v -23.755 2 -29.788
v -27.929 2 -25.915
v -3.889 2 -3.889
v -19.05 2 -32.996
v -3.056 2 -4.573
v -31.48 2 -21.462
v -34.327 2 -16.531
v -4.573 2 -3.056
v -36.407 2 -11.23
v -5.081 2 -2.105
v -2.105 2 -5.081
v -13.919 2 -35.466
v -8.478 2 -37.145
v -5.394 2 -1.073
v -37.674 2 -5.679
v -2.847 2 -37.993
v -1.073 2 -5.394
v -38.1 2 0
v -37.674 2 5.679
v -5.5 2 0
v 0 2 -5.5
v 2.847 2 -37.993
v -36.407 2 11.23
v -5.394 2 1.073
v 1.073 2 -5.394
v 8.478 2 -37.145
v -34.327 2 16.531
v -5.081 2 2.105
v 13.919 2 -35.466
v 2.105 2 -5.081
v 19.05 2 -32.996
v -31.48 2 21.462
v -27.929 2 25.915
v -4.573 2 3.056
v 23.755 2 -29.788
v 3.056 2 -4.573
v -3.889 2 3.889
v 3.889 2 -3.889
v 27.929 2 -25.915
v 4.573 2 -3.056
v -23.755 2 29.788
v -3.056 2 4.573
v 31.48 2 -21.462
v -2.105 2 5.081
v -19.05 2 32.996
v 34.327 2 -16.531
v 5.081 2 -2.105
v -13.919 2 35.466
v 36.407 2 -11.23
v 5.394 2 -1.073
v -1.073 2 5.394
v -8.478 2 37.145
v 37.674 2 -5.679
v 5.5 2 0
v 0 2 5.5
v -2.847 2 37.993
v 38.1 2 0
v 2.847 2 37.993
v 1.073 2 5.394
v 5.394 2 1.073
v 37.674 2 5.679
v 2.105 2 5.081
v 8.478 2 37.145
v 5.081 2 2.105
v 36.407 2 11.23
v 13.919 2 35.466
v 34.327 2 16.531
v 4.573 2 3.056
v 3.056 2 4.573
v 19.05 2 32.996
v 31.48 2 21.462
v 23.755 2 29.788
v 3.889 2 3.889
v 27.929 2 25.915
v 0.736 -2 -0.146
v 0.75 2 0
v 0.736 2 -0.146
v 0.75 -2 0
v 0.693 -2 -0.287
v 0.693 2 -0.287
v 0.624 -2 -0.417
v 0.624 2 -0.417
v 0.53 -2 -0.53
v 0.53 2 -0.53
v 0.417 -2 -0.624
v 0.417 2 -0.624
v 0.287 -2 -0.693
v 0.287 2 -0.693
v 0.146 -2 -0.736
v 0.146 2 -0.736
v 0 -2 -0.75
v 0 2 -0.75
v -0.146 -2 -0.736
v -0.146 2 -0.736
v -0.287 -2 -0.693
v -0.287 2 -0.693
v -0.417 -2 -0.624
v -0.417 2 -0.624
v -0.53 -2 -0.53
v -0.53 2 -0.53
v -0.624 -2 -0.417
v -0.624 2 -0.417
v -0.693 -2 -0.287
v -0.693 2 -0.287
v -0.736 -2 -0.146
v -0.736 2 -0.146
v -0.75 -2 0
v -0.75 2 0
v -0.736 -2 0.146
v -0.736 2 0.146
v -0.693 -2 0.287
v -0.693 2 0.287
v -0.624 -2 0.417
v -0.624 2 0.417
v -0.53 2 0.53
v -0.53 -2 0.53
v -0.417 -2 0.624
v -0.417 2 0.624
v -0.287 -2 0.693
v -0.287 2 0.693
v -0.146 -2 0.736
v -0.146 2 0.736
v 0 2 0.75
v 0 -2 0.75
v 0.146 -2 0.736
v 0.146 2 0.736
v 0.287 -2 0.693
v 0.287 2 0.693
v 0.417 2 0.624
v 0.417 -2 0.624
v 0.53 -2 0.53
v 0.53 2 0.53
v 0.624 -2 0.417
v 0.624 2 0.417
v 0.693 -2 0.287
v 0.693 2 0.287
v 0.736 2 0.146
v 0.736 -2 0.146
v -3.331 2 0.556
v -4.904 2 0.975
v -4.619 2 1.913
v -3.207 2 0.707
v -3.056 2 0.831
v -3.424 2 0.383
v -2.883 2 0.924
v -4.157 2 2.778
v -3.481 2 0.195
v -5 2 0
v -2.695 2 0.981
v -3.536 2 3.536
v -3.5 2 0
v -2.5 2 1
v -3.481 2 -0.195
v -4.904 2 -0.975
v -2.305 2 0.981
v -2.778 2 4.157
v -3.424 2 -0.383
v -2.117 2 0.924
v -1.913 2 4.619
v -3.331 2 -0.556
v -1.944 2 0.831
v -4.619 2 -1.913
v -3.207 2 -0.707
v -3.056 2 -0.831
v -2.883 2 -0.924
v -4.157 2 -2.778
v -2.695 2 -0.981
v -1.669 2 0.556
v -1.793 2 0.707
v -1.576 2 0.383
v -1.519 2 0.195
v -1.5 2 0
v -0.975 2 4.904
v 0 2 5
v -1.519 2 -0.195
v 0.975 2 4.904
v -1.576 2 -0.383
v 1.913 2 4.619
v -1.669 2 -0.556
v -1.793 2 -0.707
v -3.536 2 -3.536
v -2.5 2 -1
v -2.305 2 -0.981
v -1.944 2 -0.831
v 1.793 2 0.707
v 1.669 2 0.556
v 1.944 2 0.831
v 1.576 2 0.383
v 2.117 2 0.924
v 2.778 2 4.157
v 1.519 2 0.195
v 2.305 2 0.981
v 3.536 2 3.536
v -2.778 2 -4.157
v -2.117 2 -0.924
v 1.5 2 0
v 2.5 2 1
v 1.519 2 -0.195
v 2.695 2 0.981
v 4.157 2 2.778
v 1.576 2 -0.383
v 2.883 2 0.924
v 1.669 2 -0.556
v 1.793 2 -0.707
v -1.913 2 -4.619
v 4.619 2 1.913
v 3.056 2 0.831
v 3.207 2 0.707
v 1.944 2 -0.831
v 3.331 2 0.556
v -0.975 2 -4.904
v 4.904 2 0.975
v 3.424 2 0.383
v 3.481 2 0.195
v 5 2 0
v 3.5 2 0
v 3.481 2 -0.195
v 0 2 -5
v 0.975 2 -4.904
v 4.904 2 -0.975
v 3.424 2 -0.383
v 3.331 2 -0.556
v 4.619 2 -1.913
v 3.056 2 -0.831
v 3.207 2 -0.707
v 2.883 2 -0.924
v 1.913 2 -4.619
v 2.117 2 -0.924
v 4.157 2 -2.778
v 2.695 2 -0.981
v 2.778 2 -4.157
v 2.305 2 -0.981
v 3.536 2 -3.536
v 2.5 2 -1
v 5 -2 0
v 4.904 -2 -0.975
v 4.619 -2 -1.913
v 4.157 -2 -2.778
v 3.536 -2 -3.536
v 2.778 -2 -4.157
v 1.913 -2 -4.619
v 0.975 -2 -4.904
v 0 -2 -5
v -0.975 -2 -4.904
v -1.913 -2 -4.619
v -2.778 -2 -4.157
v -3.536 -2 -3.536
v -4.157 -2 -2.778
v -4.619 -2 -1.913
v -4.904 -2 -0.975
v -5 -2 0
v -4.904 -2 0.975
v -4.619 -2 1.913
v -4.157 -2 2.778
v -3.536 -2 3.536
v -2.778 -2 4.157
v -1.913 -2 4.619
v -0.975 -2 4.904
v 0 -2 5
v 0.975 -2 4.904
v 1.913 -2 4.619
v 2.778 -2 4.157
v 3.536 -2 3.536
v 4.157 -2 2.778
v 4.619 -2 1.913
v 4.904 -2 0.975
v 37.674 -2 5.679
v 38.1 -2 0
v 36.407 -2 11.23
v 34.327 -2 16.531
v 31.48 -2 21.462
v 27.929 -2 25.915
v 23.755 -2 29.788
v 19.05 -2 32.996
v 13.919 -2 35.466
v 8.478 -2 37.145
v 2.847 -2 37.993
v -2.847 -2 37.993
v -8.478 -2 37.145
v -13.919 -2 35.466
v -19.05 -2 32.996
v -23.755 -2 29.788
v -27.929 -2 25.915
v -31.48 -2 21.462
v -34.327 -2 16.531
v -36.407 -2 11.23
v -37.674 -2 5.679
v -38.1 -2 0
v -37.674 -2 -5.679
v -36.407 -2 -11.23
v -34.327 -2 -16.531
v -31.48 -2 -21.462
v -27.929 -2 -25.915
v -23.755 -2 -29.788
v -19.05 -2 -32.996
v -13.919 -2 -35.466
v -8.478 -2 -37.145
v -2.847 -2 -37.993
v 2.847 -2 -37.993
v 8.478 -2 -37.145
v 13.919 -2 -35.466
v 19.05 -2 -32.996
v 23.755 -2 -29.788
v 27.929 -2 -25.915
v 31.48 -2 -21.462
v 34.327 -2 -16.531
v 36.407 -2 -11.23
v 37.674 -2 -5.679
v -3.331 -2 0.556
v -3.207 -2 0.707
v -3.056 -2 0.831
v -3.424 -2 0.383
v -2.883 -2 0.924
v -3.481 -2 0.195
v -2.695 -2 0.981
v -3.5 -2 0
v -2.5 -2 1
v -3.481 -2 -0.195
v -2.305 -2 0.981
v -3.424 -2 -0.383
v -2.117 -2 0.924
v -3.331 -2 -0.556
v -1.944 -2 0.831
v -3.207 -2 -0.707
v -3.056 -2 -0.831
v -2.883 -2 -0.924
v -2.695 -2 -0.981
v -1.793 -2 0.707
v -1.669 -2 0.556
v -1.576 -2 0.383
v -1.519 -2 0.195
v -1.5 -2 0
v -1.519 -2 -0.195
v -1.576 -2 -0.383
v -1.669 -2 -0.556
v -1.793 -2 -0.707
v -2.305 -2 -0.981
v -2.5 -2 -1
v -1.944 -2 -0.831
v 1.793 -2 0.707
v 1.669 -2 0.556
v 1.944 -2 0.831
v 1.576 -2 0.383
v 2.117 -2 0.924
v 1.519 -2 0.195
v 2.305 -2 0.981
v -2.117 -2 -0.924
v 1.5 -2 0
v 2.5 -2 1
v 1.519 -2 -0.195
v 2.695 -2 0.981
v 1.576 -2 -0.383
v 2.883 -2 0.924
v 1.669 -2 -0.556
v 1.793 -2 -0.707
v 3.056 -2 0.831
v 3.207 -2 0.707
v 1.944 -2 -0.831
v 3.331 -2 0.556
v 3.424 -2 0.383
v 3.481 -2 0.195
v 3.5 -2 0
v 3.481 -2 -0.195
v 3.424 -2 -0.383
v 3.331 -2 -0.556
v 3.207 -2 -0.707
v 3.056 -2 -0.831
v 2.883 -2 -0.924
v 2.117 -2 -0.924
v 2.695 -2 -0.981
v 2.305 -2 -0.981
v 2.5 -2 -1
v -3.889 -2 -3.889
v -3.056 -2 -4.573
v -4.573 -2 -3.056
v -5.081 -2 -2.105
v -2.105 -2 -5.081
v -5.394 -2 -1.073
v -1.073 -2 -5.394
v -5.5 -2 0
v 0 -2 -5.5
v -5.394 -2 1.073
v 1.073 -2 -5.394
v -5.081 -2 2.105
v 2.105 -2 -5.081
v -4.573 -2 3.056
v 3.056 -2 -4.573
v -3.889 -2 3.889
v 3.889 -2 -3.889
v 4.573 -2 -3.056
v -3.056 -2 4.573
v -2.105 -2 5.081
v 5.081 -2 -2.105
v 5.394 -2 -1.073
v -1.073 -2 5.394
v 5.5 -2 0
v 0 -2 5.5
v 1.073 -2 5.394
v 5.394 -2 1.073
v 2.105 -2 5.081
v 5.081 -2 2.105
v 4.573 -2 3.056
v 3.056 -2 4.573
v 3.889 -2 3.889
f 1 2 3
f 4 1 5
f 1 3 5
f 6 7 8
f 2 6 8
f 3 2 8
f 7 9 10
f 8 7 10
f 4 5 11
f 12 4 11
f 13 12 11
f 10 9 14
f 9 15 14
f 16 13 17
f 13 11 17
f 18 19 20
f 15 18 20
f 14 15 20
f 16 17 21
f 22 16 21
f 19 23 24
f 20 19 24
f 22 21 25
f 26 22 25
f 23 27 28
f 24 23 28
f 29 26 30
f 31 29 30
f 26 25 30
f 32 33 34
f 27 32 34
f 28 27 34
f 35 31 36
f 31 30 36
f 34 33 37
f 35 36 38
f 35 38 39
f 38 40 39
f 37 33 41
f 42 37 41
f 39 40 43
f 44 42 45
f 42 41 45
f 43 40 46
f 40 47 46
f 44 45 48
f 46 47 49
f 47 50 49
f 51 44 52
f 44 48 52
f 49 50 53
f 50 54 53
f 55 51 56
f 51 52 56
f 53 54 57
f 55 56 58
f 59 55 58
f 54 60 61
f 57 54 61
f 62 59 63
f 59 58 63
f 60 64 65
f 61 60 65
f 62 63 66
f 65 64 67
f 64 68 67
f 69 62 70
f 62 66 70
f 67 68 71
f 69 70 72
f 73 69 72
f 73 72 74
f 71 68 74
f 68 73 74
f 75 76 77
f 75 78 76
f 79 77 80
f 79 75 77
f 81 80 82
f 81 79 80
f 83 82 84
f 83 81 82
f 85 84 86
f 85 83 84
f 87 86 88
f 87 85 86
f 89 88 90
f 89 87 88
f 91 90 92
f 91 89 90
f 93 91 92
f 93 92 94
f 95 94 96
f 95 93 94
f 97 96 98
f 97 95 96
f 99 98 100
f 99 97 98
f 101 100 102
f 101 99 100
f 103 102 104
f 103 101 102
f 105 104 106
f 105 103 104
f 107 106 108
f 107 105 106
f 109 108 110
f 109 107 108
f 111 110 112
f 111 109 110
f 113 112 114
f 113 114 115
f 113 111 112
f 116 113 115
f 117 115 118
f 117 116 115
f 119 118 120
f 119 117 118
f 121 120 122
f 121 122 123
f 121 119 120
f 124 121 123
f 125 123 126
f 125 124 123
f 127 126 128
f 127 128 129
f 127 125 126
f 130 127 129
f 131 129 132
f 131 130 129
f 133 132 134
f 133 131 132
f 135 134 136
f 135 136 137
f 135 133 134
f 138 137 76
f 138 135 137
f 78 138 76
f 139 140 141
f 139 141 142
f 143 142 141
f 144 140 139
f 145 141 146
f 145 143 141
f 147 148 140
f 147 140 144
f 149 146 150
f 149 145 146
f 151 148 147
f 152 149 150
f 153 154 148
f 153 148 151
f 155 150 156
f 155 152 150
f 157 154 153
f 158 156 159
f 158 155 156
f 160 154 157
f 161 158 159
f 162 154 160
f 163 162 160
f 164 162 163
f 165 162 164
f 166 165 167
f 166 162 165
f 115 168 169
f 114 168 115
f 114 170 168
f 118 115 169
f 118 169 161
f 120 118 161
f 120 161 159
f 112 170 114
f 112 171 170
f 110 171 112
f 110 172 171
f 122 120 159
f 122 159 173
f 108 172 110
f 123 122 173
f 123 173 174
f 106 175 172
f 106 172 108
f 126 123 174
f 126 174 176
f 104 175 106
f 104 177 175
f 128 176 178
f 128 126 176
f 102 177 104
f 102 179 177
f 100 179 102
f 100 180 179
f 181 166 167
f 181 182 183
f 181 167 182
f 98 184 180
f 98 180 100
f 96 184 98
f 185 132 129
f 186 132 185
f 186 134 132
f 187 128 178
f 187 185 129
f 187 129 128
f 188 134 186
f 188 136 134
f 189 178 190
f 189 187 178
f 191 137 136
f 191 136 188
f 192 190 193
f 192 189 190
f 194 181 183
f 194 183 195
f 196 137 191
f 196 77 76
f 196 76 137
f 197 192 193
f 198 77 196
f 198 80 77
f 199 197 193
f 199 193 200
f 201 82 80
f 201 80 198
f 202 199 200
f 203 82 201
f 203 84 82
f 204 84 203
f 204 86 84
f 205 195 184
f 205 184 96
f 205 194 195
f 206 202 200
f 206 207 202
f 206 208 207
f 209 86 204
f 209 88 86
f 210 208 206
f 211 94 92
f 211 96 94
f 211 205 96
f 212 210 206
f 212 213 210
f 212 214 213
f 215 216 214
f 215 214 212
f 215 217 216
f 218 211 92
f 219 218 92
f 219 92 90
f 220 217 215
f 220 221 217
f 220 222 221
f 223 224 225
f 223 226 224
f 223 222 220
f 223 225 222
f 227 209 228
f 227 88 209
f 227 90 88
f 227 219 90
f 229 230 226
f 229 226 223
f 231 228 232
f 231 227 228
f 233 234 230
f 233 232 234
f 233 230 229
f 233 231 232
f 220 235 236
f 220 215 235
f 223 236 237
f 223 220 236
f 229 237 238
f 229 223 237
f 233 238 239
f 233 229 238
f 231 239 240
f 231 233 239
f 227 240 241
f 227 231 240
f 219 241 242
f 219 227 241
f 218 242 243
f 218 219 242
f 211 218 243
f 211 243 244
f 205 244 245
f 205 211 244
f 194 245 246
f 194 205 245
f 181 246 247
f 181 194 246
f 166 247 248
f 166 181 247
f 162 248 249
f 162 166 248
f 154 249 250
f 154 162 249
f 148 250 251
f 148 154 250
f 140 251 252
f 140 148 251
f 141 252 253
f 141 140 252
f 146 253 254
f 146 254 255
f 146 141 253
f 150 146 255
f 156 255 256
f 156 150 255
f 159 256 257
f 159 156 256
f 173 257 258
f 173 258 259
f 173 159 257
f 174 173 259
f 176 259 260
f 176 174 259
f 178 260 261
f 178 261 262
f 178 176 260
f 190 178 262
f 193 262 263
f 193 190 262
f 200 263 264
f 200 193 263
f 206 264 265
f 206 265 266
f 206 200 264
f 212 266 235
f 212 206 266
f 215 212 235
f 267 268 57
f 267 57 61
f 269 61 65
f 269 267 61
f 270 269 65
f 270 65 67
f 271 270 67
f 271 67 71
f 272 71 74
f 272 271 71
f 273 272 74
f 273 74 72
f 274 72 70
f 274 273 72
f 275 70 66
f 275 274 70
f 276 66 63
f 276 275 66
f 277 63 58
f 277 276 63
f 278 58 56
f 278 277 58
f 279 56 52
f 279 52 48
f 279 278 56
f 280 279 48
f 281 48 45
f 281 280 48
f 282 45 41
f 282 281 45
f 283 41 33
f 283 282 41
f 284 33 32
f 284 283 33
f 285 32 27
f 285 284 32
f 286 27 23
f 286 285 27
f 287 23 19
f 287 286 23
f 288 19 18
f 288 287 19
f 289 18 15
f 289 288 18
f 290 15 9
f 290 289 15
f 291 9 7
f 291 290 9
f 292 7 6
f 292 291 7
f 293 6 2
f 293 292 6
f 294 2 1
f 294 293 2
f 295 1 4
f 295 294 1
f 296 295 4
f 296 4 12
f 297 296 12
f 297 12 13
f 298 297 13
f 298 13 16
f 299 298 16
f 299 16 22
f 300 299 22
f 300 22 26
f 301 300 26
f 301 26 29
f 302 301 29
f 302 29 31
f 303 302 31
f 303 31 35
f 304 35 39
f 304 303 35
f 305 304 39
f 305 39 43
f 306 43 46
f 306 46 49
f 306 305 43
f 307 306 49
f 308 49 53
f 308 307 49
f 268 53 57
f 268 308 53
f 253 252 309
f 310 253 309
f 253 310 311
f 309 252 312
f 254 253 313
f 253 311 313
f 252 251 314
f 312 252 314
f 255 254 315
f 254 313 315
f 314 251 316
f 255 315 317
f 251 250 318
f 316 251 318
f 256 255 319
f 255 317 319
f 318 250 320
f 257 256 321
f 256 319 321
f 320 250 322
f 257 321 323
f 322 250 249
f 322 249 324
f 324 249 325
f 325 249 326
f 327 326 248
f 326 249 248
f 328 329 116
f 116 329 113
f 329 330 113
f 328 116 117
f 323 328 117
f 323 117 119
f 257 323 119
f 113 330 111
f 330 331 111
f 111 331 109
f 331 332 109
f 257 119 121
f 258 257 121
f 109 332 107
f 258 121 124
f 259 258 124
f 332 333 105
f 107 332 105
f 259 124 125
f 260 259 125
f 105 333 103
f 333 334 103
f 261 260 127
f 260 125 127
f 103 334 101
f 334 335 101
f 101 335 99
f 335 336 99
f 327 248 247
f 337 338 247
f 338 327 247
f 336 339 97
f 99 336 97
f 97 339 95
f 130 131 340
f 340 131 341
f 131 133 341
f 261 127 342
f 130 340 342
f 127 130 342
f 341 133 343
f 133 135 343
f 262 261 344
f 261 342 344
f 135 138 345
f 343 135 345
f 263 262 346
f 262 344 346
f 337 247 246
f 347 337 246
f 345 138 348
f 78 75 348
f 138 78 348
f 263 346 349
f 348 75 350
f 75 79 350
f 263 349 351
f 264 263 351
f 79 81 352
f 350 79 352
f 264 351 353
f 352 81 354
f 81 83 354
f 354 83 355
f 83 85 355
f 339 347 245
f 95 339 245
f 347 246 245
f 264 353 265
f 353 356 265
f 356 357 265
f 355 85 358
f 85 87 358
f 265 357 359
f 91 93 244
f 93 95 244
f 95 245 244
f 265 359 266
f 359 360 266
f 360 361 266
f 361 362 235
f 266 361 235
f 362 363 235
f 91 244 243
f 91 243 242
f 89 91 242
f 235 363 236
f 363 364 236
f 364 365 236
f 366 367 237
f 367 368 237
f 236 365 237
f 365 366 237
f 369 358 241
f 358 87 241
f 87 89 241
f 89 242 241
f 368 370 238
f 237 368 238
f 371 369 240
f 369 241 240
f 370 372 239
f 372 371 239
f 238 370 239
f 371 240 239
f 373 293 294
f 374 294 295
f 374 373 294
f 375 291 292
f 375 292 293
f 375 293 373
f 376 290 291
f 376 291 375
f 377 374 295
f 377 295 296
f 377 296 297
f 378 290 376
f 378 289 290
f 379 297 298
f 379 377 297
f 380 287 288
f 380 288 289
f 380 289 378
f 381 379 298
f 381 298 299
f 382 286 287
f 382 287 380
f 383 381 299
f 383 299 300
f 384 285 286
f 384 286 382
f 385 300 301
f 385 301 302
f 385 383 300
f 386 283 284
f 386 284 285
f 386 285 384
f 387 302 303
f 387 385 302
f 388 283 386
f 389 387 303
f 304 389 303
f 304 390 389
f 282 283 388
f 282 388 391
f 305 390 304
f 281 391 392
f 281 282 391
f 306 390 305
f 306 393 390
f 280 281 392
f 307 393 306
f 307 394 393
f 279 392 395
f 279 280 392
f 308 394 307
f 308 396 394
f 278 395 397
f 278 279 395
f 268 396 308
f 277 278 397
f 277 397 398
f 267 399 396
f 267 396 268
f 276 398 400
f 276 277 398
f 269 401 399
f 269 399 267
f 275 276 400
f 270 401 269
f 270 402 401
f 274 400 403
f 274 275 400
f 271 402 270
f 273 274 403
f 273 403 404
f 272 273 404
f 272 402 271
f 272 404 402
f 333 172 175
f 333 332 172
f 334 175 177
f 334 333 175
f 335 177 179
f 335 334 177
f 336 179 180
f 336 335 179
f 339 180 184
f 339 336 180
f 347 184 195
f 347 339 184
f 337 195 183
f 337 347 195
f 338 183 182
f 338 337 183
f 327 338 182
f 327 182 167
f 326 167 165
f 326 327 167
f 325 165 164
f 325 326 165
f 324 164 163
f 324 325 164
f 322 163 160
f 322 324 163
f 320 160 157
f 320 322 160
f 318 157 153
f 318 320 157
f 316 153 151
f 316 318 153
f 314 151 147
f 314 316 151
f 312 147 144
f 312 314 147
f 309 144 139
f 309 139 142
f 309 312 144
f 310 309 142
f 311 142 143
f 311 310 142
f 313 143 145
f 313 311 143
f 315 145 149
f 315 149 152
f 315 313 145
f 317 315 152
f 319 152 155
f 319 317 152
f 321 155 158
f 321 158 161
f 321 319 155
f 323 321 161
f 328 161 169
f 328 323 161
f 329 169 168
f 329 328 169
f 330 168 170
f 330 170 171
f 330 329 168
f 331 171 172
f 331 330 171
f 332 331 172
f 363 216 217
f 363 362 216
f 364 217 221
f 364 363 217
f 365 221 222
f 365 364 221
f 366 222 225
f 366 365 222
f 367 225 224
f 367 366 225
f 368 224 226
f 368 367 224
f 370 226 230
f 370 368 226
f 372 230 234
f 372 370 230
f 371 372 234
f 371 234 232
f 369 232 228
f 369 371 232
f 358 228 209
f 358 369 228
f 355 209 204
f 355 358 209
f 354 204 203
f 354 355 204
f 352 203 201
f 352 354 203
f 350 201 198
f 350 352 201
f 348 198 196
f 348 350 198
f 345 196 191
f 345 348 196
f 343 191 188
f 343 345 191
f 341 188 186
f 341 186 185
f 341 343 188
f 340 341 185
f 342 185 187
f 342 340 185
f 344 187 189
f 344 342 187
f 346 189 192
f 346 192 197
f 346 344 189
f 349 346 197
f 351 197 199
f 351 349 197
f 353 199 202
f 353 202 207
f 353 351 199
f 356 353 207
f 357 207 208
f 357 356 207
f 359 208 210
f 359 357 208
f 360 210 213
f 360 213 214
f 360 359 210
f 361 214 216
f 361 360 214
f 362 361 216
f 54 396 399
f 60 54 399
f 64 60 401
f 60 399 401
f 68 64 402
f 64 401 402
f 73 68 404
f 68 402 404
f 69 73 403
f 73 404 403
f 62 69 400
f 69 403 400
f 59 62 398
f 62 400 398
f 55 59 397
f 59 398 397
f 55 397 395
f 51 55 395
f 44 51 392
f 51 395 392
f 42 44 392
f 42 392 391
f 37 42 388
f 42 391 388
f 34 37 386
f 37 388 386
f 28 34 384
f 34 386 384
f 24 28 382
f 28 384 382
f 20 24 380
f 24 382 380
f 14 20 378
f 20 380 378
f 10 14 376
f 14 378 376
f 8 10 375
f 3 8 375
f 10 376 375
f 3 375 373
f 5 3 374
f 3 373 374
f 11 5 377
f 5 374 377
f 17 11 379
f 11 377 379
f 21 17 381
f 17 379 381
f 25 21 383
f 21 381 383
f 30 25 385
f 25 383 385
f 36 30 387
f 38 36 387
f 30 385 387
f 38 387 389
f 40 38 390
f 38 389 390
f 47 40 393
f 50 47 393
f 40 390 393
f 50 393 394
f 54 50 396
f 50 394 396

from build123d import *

# Parameters (mm, degrees)
SKETCH1_R           = 5
SKETCH1_R_2         = 0.75
SKETCH1_R_3         = 1
BOSS_EXTRUDE1_DEPTH = 2
SKETCH2_R           = 38.1
SKETCH2_R_2         = 5.5
BOSS_EXTRUDE2_DEPTH = 4


with BuildPart() as part:
    # Sketch1 → Boss-Extrude1 (new body, symmetric)
    with BuildSketch(Plane(origin=(0, 0, 0), x_dir=(1, 0, 0), z_dir=(0, 1, 0))):
        Circle(SKETCH1_R)
        Circle(SKETCH1_R_2, mode=Mode.SUBTRACT)
        with Locations((-2.5, 0)):
            Circle(SKETCH1_R_3, mode=Mode.SUBTRACT)
        with Locations((2.5, 0)):
            Circle(SKETCH1_R_3, mode=Mode.SUBTRACT)
    extrude(amount=BOSS_EXTRUDE1_DEPTH, both=True)


with BuildPart() as body_2:
    # Sketch2 → Boss-Extrude2 (new body)
    with BuildSketch(Plane.XZ.offset(2)):
        Circle(SKETCH2_R)
        Circle(SKETCH2_R_2, mode=Mode.SUBTRACT)
    extrude(amount=-BOSS_EXTRUDE2_DEPTH)


solid = Compound([part.part, body_2.part])
